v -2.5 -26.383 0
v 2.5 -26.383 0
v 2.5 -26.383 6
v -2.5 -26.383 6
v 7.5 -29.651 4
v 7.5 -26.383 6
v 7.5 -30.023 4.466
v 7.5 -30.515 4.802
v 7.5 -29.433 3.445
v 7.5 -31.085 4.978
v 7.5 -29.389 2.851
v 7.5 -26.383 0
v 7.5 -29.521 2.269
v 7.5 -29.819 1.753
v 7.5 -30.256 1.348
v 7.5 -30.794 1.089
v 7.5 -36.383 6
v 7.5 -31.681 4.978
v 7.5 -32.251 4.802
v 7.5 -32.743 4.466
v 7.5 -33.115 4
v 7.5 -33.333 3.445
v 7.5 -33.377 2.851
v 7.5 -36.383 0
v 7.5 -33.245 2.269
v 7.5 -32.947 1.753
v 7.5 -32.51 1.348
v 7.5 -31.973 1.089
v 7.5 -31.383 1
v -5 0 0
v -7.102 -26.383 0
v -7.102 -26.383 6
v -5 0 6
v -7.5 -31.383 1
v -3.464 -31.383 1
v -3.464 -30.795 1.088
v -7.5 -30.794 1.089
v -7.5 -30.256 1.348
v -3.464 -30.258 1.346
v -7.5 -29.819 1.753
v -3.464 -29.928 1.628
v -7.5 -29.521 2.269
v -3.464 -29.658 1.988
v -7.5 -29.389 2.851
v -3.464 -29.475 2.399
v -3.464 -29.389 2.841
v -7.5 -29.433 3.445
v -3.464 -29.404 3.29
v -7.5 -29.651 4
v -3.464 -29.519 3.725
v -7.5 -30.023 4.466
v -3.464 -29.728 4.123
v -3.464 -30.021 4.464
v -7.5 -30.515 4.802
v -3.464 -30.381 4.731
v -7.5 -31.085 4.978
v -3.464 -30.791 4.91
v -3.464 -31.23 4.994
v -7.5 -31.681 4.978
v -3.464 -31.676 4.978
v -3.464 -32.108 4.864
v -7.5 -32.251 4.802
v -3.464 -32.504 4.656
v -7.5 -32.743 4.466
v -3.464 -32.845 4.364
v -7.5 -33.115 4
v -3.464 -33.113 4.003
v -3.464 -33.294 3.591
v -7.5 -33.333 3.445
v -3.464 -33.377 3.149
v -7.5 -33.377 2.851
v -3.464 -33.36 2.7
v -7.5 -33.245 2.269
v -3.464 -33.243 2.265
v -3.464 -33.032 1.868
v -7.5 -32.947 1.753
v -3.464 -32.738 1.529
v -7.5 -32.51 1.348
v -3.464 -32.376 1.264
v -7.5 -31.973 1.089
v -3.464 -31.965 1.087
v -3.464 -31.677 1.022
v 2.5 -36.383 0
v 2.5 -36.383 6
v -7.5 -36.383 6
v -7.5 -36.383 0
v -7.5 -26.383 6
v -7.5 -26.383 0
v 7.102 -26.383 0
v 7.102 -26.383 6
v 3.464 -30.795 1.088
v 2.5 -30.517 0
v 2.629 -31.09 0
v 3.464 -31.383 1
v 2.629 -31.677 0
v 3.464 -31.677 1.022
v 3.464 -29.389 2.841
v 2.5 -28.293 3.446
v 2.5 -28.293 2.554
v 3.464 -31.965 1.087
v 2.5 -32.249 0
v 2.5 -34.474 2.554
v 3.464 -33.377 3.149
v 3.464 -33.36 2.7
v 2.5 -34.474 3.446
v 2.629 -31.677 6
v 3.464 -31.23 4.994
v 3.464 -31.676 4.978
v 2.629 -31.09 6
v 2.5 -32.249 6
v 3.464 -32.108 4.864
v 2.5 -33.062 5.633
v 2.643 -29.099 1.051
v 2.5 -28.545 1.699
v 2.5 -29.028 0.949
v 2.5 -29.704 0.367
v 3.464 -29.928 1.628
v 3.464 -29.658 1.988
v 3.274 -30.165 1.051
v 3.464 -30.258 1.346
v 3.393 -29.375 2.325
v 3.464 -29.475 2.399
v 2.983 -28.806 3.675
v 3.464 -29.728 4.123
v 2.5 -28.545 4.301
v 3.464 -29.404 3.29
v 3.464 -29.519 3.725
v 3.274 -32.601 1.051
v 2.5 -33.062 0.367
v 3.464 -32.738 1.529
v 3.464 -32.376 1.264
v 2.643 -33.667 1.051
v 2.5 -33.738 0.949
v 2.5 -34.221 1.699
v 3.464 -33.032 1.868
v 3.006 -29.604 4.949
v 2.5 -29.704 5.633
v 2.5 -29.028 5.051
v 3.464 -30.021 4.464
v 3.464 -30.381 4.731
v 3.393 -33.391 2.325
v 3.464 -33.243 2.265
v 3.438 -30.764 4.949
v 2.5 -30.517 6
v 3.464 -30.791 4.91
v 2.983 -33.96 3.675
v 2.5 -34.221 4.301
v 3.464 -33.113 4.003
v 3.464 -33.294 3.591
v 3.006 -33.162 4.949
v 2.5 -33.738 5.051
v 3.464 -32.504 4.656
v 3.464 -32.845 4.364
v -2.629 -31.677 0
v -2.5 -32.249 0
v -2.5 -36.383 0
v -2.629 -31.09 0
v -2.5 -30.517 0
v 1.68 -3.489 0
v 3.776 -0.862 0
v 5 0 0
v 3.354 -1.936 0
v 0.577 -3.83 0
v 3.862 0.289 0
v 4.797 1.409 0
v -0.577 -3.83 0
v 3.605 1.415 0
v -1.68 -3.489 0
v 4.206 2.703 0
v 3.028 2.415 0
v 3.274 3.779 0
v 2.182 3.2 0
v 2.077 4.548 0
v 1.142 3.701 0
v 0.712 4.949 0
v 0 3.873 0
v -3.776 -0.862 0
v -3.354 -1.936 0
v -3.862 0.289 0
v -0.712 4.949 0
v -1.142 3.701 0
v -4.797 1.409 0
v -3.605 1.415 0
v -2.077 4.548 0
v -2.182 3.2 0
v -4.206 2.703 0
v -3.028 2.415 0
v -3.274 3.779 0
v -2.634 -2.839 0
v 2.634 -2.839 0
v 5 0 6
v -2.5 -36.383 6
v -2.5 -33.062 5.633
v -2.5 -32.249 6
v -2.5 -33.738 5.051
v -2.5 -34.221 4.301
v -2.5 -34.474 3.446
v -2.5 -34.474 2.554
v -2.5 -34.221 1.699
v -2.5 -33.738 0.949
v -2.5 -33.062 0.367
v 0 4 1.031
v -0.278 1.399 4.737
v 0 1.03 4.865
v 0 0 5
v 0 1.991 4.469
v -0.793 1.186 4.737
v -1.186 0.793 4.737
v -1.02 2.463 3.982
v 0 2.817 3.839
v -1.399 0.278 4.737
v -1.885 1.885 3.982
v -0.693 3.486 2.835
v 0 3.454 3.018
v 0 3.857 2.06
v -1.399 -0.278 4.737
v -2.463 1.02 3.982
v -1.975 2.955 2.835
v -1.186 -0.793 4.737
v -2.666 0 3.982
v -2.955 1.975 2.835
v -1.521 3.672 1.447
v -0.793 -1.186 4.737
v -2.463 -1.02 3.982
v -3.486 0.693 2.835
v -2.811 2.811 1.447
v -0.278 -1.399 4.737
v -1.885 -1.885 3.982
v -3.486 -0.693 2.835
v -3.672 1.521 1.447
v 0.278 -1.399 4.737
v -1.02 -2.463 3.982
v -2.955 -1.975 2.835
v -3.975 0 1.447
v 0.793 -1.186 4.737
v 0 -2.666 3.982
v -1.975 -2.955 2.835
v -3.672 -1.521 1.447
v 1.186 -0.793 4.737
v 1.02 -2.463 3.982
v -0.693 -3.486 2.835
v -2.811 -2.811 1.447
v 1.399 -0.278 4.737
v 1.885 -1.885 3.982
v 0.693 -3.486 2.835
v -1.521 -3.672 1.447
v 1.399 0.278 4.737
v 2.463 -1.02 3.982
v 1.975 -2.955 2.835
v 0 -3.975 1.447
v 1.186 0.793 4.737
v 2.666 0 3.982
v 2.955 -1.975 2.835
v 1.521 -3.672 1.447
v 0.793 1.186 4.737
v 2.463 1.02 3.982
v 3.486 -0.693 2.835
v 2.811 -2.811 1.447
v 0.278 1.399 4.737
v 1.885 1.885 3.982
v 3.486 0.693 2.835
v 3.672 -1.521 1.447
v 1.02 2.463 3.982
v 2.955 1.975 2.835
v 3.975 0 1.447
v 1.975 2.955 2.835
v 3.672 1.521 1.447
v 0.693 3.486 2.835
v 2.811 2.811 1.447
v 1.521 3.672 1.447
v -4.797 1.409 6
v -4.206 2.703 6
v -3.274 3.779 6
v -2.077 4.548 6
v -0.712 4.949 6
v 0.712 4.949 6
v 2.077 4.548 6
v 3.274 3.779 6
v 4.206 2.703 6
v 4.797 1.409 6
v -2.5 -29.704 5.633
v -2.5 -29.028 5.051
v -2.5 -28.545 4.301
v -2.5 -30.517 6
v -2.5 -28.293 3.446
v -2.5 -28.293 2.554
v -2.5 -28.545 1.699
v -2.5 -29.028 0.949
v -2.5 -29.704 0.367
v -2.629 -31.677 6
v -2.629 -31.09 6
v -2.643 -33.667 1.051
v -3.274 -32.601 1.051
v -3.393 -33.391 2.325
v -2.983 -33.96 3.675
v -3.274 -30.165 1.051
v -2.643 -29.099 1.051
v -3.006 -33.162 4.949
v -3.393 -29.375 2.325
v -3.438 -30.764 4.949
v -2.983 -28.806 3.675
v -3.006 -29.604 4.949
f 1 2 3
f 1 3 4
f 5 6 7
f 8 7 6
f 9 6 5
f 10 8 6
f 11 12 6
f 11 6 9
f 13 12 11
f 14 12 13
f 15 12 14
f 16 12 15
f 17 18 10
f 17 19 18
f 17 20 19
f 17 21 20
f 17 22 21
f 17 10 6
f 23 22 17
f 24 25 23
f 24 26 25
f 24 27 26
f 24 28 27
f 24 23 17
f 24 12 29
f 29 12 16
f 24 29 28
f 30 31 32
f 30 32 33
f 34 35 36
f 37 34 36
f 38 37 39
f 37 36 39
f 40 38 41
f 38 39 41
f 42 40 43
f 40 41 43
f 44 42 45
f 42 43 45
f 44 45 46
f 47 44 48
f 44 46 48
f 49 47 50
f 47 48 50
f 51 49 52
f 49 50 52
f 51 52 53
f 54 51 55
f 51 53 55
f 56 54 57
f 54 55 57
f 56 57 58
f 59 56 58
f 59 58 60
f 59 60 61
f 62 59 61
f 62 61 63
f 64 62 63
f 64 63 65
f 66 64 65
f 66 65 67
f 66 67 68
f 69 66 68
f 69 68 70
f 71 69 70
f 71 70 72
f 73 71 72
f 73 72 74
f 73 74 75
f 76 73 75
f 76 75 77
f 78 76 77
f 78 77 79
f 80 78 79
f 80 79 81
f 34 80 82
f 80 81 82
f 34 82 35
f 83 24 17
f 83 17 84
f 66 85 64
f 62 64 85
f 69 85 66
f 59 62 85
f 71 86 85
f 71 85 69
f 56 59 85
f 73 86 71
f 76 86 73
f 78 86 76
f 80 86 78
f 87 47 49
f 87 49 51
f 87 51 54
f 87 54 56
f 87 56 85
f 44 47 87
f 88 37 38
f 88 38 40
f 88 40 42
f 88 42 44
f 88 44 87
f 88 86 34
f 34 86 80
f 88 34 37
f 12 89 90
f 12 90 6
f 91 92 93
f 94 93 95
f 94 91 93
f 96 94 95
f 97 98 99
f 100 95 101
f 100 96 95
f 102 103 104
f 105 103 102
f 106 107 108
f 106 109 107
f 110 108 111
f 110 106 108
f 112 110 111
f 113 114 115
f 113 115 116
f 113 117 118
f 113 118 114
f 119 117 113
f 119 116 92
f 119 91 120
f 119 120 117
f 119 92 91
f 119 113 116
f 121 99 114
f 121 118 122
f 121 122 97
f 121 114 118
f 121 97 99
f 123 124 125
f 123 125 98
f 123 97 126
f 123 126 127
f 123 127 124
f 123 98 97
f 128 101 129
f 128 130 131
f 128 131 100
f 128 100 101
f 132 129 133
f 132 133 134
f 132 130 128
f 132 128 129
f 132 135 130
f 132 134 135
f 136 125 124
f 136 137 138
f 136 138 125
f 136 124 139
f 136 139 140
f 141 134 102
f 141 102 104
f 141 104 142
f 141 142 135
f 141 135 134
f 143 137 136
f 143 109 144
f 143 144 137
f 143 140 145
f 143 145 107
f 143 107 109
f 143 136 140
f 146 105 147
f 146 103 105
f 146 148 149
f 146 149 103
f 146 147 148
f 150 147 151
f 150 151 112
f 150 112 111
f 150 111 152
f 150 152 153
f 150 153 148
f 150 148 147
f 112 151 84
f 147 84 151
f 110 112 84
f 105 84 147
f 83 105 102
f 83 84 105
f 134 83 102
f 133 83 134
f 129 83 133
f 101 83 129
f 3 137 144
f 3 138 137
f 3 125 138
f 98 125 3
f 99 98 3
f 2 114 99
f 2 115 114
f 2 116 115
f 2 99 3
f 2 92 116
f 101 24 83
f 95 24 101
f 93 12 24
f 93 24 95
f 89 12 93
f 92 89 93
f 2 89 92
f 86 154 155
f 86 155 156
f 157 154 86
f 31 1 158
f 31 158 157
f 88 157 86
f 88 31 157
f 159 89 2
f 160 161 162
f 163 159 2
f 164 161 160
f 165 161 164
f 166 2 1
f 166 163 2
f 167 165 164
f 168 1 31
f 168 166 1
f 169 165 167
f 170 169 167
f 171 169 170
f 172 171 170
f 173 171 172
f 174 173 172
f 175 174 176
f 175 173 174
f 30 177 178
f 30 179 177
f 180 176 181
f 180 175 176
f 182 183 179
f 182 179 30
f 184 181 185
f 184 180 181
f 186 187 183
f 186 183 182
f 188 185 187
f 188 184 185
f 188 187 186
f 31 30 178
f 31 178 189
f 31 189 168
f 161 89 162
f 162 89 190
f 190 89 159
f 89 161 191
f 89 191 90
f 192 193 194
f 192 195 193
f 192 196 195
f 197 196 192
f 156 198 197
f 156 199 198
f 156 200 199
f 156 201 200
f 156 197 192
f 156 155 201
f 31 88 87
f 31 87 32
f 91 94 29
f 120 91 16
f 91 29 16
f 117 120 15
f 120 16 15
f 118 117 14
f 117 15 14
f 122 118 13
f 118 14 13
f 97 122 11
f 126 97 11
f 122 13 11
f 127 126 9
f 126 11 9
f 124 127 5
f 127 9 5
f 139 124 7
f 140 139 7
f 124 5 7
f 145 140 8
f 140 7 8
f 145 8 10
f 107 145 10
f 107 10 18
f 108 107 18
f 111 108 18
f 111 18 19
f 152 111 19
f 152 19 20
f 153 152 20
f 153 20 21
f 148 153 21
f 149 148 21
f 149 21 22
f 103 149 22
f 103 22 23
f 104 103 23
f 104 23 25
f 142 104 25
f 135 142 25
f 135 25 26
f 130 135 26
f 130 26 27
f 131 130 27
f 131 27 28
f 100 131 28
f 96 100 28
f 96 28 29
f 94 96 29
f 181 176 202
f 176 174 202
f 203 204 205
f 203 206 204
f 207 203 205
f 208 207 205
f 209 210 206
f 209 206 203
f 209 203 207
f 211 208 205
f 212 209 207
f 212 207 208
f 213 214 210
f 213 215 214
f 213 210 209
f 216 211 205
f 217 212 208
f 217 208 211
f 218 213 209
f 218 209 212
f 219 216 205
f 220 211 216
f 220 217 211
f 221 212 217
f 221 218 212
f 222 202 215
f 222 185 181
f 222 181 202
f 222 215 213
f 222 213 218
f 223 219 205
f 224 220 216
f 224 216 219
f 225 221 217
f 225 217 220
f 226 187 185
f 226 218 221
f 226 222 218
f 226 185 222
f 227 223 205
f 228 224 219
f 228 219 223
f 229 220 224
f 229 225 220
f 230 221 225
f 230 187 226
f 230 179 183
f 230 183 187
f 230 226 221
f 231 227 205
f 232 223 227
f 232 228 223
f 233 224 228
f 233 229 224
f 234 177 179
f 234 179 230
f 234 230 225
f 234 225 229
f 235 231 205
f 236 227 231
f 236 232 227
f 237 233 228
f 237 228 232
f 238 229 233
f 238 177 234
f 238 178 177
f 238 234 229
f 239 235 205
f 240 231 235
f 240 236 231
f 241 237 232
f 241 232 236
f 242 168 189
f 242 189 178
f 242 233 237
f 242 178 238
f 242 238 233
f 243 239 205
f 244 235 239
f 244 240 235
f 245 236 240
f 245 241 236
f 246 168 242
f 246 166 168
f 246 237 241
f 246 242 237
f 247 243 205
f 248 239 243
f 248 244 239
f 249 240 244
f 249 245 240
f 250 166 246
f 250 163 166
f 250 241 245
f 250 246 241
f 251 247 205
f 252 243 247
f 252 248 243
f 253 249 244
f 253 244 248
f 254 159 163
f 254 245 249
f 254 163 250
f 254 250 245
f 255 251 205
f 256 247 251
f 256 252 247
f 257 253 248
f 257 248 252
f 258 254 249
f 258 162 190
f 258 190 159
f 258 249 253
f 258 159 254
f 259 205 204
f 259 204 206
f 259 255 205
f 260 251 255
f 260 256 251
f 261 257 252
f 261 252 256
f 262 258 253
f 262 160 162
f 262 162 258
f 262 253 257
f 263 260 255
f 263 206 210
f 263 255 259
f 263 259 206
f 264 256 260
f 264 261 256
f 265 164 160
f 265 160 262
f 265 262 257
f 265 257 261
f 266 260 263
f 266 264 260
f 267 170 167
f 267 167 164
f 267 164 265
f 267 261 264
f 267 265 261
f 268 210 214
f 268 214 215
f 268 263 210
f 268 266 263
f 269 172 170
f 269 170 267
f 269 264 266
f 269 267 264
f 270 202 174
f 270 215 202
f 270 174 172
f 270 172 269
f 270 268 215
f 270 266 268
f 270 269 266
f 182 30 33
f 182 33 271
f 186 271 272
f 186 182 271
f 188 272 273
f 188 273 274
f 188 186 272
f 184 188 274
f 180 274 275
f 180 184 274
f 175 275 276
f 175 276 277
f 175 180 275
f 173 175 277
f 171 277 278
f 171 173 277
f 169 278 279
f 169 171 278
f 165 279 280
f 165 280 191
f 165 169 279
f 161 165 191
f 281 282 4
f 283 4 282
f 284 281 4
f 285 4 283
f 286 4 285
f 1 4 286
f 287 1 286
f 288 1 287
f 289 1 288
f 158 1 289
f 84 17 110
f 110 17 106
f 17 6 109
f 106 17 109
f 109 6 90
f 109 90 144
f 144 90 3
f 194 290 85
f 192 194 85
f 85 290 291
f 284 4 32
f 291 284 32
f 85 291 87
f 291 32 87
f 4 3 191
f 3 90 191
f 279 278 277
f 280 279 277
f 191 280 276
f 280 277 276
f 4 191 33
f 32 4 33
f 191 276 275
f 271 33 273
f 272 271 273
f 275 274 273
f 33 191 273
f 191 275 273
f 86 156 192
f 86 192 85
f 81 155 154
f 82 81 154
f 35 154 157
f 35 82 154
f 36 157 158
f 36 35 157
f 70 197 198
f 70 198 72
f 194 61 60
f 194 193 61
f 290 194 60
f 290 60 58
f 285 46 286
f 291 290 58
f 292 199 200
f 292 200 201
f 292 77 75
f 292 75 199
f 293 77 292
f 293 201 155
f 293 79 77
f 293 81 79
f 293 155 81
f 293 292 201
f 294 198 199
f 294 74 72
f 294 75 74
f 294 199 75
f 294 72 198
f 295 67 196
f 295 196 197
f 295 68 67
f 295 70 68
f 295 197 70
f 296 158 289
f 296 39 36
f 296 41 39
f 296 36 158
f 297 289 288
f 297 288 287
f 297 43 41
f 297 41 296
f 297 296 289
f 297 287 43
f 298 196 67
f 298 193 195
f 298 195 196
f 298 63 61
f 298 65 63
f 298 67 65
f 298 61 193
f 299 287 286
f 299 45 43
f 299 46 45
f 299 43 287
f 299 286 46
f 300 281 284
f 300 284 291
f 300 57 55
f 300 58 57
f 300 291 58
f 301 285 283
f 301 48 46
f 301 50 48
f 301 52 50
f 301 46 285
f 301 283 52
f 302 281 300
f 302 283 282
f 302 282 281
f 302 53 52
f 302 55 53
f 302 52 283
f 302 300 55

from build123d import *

# Parameters (mm, degrees)
SALIENTE_EXTRUIR1_DEPTH = 6
CROQUIS4_R              = 2
CORTAR_EXTRUIR1_DEPTH   = 15


with BuildPart() as part:
    # Croquis1 → Saliente-Extruir1 (new body)
    with BuildSketch(Plane.XY):
        with BuildLine():
            Line((7.5, -36.38301994), (2.5, -36.38301994))
            Line((2.5, -36.38301994), (2.5, -26.38301994))
            Line((2.5, -26.38301994), (-2.5, -26.38301994))
            Line((-2.5, -26.38301994), (-2.5, -36.38301994))
            Line((-2.5, -36.38301994), (-7.5, -36.38301994))
            Line((-7.5, -36.38301994), (-7.5, -26.38301994))
            Line((-7.5, -26.38301994), (-7.101695438, -26.38301994))
            Line((-7.101695438, -26.38301994), (-5, 0))
            ThreePointArc((-5, 0), (0, 5), (5, 0))
            Line((5, 0), (7.101695438, -26.38301994))
            Line((7.101695438, -26.38301994), (7.5, -26.38301994))
            Line((7.5, -26.38301994), (7.5, -36.38301994))
        make_face()
    extrude(amount=SALIENTE_EXTRUIR1_DEPTH)

    # Croquis2 → Cortar-Revolución1 (revolve, cut)
    with BuildSketch(Plane(origin=(0, 0, 0), x_dir=(0, 0, -1), z_dir=(1, 0, 0))):
        with BuildLine():
            Line((3, 0), (-5, 0))
            ThreePointArc((-5, 0), (-1, 4), (3, 0))
        make_face()
    revolve(axis=Axis((0, 0, -3), (0, 0, 1)), mode=Mode.SUBTRACT)

    # Croquis4 → Cortar-Extruir1 (cut)
    with BuildSketch(Plane(origin=(7.5, 0, 0), x_dir=(0, 0, -1), z_dir=(1, 0, 0))):
        with Locations((-3, -31.38301994)):
            Circle(CROQUIS4_R)
    extrude(amount=-CORTAR_EXTRUIR1_DEPTH, mode=Mode.SUBTRACT)

    # Croquis5 → Cortar-Revolución2 (revolve, cut)
    with BuildSketch(Plane(origin=(0, 0, 0), x_dir=(0, 0, -1), z_dir=(1, 0, 0))):
        with BuildLine():
            Line((-7, -31.38301994), (1, -31.38301994))
            ThreePointArc((1, -31.38301994), (-3, -27.38301994), (-7, -31.38301994))
        make_face()
    revolve(axis=Axis((0, -31.38301994, 7), (0, 0, -1)), mode=Mode.SUBTRACT)


solid = part.part
